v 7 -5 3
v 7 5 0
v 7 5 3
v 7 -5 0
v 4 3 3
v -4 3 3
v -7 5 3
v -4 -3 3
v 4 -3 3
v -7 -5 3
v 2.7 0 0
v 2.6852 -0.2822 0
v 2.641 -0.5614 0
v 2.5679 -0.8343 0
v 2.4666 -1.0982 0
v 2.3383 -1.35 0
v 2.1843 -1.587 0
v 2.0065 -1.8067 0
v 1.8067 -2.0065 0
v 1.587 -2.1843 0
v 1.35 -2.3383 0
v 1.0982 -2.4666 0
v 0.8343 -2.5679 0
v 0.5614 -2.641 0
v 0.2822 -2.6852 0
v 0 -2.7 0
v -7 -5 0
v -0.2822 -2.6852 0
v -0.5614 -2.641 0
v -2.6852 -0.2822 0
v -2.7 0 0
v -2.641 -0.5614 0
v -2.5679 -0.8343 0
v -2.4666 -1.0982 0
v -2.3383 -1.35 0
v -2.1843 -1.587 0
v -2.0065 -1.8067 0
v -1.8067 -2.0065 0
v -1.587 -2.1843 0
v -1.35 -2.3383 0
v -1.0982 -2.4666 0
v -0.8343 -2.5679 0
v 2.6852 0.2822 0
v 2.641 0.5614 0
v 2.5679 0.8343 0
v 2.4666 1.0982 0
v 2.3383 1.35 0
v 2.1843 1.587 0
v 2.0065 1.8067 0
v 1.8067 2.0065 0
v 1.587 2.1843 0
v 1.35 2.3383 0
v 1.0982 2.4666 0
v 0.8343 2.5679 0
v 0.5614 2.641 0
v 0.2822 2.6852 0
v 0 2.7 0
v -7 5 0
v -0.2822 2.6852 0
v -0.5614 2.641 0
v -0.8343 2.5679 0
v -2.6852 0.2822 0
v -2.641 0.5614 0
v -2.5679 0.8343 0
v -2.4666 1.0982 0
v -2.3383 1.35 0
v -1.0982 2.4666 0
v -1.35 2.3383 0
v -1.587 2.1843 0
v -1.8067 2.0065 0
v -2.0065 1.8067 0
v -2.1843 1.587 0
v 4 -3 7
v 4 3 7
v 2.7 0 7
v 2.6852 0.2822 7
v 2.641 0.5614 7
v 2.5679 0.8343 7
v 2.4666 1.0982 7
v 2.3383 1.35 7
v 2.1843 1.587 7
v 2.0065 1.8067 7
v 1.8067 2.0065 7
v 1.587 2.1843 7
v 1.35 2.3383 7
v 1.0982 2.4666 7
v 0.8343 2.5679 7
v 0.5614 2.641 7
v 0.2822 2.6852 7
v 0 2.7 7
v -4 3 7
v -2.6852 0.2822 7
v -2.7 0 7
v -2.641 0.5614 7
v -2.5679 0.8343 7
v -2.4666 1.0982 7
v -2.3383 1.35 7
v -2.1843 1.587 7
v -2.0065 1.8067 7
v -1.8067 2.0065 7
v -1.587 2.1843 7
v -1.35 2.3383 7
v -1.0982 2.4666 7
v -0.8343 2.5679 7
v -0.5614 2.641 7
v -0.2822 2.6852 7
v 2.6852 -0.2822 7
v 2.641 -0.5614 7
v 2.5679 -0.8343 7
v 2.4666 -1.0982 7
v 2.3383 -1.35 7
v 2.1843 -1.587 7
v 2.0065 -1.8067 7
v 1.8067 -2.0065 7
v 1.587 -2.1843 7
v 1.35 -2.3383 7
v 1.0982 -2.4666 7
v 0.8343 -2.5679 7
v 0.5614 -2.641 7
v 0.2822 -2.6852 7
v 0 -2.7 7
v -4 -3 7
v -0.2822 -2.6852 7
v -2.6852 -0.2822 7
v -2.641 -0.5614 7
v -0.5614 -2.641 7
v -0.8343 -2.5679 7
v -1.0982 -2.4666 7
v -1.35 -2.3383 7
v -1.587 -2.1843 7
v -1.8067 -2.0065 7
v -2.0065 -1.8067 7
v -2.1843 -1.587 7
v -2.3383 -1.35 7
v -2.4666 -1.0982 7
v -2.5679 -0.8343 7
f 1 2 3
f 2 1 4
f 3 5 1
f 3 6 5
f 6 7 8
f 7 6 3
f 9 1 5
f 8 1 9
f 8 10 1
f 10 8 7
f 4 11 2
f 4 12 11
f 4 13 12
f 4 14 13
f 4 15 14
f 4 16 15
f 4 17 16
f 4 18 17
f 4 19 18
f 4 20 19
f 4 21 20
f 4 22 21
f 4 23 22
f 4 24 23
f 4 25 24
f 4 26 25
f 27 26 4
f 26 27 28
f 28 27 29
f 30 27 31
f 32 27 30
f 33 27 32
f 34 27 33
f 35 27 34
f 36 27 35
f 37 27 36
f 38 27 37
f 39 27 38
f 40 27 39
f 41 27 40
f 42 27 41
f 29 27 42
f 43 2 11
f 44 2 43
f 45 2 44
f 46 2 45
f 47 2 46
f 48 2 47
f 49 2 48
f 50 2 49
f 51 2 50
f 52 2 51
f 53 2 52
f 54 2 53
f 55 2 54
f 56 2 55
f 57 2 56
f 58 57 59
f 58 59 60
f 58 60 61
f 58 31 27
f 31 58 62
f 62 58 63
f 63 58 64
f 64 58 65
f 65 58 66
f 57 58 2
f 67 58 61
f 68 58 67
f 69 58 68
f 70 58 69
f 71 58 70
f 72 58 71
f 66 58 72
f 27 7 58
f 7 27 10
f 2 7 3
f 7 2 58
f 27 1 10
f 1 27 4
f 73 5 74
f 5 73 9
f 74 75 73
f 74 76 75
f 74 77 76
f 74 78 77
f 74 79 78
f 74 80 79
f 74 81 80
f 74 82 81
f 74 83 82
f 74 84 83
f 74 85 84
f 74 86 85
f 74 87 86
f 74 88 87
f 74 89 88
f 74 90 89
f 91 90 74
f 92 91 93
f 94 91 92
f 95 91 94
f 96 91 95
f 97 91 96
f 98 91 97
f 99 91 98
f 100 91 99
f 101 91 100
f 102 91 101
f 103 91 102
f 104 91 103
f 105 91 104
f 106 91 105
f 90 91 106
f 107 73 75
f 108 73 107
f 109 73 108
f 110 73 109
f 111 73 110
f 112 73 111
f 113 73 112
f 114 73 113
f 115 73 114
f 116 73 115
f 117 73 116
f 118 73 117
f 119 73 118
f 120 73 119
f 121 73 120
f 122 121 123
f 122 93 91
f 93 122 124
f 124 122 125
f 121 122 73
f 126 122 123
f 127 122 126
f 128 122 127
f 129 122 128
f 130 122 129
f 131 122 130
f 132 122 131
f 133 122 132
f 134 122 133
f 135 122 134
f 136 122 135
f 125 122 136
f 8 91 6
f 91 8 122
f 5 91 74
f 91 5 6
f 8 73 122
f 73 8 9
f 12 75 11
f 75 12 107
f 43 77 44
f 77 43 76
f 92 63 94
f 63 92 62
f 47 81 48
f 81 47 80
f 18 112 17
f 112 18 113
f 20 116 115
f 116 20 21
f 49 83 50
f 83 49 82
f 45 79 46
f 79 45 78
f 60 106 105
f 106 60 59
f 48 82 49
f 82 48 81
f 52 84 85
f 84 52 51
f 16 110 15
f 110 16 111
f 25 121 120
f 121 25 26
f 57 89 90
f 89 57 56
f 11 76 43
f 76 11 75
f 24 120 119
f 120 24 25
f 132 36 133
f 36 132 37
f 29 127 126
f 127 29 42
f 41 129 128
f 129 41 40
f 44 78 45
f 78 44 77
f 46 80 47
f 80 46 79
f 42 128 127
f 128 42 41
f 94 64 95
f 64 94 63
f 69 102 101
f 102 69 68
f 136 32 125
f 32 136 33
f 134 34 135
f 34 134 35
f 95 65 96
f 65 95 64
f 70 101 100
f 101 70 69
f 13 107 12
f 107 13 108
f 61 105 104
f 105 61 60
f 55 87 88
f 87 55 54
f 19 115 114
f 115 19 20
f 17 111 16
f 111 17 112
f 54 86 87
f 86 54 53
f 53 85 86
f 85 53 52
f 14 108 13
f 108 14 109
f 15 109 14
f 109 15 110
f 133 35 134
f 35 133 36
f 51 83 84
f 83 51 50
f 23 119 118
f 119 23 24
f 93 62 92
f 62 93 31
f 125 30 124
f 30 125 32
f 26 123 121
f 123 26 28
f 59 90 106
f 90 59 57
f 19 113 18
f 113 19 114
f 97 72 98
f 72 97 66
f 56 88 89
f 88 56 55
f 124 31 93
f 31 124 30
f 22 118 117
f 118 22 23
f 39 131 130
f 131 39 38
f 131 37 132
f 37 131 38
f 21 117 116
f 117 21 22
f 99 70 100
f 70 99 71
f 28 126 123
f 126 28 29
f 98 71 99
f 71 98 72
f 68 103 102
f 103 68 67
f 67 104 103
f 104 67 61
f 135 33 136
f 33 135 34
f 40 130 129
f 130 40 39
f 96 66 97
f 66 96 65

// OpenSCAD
// T-slot nut for aluminium extrusion.
$fn = 60;
eps = 0.02;
slot_w = 6;
thread_d = 5.4;
length = 14;
body_w = slot_w + 4;
body_h = 7;
difference() {
    union() {
        translate([-length / 2, -body_w / 2, 0]) cube([length, body_w, 3]);
        translate([-length / 2 + 3, -slot_w / 2, 3]) cube([length - 6, slot_w, body_h - 3]);
    }
    translate([0, 0, -eps]) cylinder(d = thread_d, h = body_h + 2 * eps);
}
